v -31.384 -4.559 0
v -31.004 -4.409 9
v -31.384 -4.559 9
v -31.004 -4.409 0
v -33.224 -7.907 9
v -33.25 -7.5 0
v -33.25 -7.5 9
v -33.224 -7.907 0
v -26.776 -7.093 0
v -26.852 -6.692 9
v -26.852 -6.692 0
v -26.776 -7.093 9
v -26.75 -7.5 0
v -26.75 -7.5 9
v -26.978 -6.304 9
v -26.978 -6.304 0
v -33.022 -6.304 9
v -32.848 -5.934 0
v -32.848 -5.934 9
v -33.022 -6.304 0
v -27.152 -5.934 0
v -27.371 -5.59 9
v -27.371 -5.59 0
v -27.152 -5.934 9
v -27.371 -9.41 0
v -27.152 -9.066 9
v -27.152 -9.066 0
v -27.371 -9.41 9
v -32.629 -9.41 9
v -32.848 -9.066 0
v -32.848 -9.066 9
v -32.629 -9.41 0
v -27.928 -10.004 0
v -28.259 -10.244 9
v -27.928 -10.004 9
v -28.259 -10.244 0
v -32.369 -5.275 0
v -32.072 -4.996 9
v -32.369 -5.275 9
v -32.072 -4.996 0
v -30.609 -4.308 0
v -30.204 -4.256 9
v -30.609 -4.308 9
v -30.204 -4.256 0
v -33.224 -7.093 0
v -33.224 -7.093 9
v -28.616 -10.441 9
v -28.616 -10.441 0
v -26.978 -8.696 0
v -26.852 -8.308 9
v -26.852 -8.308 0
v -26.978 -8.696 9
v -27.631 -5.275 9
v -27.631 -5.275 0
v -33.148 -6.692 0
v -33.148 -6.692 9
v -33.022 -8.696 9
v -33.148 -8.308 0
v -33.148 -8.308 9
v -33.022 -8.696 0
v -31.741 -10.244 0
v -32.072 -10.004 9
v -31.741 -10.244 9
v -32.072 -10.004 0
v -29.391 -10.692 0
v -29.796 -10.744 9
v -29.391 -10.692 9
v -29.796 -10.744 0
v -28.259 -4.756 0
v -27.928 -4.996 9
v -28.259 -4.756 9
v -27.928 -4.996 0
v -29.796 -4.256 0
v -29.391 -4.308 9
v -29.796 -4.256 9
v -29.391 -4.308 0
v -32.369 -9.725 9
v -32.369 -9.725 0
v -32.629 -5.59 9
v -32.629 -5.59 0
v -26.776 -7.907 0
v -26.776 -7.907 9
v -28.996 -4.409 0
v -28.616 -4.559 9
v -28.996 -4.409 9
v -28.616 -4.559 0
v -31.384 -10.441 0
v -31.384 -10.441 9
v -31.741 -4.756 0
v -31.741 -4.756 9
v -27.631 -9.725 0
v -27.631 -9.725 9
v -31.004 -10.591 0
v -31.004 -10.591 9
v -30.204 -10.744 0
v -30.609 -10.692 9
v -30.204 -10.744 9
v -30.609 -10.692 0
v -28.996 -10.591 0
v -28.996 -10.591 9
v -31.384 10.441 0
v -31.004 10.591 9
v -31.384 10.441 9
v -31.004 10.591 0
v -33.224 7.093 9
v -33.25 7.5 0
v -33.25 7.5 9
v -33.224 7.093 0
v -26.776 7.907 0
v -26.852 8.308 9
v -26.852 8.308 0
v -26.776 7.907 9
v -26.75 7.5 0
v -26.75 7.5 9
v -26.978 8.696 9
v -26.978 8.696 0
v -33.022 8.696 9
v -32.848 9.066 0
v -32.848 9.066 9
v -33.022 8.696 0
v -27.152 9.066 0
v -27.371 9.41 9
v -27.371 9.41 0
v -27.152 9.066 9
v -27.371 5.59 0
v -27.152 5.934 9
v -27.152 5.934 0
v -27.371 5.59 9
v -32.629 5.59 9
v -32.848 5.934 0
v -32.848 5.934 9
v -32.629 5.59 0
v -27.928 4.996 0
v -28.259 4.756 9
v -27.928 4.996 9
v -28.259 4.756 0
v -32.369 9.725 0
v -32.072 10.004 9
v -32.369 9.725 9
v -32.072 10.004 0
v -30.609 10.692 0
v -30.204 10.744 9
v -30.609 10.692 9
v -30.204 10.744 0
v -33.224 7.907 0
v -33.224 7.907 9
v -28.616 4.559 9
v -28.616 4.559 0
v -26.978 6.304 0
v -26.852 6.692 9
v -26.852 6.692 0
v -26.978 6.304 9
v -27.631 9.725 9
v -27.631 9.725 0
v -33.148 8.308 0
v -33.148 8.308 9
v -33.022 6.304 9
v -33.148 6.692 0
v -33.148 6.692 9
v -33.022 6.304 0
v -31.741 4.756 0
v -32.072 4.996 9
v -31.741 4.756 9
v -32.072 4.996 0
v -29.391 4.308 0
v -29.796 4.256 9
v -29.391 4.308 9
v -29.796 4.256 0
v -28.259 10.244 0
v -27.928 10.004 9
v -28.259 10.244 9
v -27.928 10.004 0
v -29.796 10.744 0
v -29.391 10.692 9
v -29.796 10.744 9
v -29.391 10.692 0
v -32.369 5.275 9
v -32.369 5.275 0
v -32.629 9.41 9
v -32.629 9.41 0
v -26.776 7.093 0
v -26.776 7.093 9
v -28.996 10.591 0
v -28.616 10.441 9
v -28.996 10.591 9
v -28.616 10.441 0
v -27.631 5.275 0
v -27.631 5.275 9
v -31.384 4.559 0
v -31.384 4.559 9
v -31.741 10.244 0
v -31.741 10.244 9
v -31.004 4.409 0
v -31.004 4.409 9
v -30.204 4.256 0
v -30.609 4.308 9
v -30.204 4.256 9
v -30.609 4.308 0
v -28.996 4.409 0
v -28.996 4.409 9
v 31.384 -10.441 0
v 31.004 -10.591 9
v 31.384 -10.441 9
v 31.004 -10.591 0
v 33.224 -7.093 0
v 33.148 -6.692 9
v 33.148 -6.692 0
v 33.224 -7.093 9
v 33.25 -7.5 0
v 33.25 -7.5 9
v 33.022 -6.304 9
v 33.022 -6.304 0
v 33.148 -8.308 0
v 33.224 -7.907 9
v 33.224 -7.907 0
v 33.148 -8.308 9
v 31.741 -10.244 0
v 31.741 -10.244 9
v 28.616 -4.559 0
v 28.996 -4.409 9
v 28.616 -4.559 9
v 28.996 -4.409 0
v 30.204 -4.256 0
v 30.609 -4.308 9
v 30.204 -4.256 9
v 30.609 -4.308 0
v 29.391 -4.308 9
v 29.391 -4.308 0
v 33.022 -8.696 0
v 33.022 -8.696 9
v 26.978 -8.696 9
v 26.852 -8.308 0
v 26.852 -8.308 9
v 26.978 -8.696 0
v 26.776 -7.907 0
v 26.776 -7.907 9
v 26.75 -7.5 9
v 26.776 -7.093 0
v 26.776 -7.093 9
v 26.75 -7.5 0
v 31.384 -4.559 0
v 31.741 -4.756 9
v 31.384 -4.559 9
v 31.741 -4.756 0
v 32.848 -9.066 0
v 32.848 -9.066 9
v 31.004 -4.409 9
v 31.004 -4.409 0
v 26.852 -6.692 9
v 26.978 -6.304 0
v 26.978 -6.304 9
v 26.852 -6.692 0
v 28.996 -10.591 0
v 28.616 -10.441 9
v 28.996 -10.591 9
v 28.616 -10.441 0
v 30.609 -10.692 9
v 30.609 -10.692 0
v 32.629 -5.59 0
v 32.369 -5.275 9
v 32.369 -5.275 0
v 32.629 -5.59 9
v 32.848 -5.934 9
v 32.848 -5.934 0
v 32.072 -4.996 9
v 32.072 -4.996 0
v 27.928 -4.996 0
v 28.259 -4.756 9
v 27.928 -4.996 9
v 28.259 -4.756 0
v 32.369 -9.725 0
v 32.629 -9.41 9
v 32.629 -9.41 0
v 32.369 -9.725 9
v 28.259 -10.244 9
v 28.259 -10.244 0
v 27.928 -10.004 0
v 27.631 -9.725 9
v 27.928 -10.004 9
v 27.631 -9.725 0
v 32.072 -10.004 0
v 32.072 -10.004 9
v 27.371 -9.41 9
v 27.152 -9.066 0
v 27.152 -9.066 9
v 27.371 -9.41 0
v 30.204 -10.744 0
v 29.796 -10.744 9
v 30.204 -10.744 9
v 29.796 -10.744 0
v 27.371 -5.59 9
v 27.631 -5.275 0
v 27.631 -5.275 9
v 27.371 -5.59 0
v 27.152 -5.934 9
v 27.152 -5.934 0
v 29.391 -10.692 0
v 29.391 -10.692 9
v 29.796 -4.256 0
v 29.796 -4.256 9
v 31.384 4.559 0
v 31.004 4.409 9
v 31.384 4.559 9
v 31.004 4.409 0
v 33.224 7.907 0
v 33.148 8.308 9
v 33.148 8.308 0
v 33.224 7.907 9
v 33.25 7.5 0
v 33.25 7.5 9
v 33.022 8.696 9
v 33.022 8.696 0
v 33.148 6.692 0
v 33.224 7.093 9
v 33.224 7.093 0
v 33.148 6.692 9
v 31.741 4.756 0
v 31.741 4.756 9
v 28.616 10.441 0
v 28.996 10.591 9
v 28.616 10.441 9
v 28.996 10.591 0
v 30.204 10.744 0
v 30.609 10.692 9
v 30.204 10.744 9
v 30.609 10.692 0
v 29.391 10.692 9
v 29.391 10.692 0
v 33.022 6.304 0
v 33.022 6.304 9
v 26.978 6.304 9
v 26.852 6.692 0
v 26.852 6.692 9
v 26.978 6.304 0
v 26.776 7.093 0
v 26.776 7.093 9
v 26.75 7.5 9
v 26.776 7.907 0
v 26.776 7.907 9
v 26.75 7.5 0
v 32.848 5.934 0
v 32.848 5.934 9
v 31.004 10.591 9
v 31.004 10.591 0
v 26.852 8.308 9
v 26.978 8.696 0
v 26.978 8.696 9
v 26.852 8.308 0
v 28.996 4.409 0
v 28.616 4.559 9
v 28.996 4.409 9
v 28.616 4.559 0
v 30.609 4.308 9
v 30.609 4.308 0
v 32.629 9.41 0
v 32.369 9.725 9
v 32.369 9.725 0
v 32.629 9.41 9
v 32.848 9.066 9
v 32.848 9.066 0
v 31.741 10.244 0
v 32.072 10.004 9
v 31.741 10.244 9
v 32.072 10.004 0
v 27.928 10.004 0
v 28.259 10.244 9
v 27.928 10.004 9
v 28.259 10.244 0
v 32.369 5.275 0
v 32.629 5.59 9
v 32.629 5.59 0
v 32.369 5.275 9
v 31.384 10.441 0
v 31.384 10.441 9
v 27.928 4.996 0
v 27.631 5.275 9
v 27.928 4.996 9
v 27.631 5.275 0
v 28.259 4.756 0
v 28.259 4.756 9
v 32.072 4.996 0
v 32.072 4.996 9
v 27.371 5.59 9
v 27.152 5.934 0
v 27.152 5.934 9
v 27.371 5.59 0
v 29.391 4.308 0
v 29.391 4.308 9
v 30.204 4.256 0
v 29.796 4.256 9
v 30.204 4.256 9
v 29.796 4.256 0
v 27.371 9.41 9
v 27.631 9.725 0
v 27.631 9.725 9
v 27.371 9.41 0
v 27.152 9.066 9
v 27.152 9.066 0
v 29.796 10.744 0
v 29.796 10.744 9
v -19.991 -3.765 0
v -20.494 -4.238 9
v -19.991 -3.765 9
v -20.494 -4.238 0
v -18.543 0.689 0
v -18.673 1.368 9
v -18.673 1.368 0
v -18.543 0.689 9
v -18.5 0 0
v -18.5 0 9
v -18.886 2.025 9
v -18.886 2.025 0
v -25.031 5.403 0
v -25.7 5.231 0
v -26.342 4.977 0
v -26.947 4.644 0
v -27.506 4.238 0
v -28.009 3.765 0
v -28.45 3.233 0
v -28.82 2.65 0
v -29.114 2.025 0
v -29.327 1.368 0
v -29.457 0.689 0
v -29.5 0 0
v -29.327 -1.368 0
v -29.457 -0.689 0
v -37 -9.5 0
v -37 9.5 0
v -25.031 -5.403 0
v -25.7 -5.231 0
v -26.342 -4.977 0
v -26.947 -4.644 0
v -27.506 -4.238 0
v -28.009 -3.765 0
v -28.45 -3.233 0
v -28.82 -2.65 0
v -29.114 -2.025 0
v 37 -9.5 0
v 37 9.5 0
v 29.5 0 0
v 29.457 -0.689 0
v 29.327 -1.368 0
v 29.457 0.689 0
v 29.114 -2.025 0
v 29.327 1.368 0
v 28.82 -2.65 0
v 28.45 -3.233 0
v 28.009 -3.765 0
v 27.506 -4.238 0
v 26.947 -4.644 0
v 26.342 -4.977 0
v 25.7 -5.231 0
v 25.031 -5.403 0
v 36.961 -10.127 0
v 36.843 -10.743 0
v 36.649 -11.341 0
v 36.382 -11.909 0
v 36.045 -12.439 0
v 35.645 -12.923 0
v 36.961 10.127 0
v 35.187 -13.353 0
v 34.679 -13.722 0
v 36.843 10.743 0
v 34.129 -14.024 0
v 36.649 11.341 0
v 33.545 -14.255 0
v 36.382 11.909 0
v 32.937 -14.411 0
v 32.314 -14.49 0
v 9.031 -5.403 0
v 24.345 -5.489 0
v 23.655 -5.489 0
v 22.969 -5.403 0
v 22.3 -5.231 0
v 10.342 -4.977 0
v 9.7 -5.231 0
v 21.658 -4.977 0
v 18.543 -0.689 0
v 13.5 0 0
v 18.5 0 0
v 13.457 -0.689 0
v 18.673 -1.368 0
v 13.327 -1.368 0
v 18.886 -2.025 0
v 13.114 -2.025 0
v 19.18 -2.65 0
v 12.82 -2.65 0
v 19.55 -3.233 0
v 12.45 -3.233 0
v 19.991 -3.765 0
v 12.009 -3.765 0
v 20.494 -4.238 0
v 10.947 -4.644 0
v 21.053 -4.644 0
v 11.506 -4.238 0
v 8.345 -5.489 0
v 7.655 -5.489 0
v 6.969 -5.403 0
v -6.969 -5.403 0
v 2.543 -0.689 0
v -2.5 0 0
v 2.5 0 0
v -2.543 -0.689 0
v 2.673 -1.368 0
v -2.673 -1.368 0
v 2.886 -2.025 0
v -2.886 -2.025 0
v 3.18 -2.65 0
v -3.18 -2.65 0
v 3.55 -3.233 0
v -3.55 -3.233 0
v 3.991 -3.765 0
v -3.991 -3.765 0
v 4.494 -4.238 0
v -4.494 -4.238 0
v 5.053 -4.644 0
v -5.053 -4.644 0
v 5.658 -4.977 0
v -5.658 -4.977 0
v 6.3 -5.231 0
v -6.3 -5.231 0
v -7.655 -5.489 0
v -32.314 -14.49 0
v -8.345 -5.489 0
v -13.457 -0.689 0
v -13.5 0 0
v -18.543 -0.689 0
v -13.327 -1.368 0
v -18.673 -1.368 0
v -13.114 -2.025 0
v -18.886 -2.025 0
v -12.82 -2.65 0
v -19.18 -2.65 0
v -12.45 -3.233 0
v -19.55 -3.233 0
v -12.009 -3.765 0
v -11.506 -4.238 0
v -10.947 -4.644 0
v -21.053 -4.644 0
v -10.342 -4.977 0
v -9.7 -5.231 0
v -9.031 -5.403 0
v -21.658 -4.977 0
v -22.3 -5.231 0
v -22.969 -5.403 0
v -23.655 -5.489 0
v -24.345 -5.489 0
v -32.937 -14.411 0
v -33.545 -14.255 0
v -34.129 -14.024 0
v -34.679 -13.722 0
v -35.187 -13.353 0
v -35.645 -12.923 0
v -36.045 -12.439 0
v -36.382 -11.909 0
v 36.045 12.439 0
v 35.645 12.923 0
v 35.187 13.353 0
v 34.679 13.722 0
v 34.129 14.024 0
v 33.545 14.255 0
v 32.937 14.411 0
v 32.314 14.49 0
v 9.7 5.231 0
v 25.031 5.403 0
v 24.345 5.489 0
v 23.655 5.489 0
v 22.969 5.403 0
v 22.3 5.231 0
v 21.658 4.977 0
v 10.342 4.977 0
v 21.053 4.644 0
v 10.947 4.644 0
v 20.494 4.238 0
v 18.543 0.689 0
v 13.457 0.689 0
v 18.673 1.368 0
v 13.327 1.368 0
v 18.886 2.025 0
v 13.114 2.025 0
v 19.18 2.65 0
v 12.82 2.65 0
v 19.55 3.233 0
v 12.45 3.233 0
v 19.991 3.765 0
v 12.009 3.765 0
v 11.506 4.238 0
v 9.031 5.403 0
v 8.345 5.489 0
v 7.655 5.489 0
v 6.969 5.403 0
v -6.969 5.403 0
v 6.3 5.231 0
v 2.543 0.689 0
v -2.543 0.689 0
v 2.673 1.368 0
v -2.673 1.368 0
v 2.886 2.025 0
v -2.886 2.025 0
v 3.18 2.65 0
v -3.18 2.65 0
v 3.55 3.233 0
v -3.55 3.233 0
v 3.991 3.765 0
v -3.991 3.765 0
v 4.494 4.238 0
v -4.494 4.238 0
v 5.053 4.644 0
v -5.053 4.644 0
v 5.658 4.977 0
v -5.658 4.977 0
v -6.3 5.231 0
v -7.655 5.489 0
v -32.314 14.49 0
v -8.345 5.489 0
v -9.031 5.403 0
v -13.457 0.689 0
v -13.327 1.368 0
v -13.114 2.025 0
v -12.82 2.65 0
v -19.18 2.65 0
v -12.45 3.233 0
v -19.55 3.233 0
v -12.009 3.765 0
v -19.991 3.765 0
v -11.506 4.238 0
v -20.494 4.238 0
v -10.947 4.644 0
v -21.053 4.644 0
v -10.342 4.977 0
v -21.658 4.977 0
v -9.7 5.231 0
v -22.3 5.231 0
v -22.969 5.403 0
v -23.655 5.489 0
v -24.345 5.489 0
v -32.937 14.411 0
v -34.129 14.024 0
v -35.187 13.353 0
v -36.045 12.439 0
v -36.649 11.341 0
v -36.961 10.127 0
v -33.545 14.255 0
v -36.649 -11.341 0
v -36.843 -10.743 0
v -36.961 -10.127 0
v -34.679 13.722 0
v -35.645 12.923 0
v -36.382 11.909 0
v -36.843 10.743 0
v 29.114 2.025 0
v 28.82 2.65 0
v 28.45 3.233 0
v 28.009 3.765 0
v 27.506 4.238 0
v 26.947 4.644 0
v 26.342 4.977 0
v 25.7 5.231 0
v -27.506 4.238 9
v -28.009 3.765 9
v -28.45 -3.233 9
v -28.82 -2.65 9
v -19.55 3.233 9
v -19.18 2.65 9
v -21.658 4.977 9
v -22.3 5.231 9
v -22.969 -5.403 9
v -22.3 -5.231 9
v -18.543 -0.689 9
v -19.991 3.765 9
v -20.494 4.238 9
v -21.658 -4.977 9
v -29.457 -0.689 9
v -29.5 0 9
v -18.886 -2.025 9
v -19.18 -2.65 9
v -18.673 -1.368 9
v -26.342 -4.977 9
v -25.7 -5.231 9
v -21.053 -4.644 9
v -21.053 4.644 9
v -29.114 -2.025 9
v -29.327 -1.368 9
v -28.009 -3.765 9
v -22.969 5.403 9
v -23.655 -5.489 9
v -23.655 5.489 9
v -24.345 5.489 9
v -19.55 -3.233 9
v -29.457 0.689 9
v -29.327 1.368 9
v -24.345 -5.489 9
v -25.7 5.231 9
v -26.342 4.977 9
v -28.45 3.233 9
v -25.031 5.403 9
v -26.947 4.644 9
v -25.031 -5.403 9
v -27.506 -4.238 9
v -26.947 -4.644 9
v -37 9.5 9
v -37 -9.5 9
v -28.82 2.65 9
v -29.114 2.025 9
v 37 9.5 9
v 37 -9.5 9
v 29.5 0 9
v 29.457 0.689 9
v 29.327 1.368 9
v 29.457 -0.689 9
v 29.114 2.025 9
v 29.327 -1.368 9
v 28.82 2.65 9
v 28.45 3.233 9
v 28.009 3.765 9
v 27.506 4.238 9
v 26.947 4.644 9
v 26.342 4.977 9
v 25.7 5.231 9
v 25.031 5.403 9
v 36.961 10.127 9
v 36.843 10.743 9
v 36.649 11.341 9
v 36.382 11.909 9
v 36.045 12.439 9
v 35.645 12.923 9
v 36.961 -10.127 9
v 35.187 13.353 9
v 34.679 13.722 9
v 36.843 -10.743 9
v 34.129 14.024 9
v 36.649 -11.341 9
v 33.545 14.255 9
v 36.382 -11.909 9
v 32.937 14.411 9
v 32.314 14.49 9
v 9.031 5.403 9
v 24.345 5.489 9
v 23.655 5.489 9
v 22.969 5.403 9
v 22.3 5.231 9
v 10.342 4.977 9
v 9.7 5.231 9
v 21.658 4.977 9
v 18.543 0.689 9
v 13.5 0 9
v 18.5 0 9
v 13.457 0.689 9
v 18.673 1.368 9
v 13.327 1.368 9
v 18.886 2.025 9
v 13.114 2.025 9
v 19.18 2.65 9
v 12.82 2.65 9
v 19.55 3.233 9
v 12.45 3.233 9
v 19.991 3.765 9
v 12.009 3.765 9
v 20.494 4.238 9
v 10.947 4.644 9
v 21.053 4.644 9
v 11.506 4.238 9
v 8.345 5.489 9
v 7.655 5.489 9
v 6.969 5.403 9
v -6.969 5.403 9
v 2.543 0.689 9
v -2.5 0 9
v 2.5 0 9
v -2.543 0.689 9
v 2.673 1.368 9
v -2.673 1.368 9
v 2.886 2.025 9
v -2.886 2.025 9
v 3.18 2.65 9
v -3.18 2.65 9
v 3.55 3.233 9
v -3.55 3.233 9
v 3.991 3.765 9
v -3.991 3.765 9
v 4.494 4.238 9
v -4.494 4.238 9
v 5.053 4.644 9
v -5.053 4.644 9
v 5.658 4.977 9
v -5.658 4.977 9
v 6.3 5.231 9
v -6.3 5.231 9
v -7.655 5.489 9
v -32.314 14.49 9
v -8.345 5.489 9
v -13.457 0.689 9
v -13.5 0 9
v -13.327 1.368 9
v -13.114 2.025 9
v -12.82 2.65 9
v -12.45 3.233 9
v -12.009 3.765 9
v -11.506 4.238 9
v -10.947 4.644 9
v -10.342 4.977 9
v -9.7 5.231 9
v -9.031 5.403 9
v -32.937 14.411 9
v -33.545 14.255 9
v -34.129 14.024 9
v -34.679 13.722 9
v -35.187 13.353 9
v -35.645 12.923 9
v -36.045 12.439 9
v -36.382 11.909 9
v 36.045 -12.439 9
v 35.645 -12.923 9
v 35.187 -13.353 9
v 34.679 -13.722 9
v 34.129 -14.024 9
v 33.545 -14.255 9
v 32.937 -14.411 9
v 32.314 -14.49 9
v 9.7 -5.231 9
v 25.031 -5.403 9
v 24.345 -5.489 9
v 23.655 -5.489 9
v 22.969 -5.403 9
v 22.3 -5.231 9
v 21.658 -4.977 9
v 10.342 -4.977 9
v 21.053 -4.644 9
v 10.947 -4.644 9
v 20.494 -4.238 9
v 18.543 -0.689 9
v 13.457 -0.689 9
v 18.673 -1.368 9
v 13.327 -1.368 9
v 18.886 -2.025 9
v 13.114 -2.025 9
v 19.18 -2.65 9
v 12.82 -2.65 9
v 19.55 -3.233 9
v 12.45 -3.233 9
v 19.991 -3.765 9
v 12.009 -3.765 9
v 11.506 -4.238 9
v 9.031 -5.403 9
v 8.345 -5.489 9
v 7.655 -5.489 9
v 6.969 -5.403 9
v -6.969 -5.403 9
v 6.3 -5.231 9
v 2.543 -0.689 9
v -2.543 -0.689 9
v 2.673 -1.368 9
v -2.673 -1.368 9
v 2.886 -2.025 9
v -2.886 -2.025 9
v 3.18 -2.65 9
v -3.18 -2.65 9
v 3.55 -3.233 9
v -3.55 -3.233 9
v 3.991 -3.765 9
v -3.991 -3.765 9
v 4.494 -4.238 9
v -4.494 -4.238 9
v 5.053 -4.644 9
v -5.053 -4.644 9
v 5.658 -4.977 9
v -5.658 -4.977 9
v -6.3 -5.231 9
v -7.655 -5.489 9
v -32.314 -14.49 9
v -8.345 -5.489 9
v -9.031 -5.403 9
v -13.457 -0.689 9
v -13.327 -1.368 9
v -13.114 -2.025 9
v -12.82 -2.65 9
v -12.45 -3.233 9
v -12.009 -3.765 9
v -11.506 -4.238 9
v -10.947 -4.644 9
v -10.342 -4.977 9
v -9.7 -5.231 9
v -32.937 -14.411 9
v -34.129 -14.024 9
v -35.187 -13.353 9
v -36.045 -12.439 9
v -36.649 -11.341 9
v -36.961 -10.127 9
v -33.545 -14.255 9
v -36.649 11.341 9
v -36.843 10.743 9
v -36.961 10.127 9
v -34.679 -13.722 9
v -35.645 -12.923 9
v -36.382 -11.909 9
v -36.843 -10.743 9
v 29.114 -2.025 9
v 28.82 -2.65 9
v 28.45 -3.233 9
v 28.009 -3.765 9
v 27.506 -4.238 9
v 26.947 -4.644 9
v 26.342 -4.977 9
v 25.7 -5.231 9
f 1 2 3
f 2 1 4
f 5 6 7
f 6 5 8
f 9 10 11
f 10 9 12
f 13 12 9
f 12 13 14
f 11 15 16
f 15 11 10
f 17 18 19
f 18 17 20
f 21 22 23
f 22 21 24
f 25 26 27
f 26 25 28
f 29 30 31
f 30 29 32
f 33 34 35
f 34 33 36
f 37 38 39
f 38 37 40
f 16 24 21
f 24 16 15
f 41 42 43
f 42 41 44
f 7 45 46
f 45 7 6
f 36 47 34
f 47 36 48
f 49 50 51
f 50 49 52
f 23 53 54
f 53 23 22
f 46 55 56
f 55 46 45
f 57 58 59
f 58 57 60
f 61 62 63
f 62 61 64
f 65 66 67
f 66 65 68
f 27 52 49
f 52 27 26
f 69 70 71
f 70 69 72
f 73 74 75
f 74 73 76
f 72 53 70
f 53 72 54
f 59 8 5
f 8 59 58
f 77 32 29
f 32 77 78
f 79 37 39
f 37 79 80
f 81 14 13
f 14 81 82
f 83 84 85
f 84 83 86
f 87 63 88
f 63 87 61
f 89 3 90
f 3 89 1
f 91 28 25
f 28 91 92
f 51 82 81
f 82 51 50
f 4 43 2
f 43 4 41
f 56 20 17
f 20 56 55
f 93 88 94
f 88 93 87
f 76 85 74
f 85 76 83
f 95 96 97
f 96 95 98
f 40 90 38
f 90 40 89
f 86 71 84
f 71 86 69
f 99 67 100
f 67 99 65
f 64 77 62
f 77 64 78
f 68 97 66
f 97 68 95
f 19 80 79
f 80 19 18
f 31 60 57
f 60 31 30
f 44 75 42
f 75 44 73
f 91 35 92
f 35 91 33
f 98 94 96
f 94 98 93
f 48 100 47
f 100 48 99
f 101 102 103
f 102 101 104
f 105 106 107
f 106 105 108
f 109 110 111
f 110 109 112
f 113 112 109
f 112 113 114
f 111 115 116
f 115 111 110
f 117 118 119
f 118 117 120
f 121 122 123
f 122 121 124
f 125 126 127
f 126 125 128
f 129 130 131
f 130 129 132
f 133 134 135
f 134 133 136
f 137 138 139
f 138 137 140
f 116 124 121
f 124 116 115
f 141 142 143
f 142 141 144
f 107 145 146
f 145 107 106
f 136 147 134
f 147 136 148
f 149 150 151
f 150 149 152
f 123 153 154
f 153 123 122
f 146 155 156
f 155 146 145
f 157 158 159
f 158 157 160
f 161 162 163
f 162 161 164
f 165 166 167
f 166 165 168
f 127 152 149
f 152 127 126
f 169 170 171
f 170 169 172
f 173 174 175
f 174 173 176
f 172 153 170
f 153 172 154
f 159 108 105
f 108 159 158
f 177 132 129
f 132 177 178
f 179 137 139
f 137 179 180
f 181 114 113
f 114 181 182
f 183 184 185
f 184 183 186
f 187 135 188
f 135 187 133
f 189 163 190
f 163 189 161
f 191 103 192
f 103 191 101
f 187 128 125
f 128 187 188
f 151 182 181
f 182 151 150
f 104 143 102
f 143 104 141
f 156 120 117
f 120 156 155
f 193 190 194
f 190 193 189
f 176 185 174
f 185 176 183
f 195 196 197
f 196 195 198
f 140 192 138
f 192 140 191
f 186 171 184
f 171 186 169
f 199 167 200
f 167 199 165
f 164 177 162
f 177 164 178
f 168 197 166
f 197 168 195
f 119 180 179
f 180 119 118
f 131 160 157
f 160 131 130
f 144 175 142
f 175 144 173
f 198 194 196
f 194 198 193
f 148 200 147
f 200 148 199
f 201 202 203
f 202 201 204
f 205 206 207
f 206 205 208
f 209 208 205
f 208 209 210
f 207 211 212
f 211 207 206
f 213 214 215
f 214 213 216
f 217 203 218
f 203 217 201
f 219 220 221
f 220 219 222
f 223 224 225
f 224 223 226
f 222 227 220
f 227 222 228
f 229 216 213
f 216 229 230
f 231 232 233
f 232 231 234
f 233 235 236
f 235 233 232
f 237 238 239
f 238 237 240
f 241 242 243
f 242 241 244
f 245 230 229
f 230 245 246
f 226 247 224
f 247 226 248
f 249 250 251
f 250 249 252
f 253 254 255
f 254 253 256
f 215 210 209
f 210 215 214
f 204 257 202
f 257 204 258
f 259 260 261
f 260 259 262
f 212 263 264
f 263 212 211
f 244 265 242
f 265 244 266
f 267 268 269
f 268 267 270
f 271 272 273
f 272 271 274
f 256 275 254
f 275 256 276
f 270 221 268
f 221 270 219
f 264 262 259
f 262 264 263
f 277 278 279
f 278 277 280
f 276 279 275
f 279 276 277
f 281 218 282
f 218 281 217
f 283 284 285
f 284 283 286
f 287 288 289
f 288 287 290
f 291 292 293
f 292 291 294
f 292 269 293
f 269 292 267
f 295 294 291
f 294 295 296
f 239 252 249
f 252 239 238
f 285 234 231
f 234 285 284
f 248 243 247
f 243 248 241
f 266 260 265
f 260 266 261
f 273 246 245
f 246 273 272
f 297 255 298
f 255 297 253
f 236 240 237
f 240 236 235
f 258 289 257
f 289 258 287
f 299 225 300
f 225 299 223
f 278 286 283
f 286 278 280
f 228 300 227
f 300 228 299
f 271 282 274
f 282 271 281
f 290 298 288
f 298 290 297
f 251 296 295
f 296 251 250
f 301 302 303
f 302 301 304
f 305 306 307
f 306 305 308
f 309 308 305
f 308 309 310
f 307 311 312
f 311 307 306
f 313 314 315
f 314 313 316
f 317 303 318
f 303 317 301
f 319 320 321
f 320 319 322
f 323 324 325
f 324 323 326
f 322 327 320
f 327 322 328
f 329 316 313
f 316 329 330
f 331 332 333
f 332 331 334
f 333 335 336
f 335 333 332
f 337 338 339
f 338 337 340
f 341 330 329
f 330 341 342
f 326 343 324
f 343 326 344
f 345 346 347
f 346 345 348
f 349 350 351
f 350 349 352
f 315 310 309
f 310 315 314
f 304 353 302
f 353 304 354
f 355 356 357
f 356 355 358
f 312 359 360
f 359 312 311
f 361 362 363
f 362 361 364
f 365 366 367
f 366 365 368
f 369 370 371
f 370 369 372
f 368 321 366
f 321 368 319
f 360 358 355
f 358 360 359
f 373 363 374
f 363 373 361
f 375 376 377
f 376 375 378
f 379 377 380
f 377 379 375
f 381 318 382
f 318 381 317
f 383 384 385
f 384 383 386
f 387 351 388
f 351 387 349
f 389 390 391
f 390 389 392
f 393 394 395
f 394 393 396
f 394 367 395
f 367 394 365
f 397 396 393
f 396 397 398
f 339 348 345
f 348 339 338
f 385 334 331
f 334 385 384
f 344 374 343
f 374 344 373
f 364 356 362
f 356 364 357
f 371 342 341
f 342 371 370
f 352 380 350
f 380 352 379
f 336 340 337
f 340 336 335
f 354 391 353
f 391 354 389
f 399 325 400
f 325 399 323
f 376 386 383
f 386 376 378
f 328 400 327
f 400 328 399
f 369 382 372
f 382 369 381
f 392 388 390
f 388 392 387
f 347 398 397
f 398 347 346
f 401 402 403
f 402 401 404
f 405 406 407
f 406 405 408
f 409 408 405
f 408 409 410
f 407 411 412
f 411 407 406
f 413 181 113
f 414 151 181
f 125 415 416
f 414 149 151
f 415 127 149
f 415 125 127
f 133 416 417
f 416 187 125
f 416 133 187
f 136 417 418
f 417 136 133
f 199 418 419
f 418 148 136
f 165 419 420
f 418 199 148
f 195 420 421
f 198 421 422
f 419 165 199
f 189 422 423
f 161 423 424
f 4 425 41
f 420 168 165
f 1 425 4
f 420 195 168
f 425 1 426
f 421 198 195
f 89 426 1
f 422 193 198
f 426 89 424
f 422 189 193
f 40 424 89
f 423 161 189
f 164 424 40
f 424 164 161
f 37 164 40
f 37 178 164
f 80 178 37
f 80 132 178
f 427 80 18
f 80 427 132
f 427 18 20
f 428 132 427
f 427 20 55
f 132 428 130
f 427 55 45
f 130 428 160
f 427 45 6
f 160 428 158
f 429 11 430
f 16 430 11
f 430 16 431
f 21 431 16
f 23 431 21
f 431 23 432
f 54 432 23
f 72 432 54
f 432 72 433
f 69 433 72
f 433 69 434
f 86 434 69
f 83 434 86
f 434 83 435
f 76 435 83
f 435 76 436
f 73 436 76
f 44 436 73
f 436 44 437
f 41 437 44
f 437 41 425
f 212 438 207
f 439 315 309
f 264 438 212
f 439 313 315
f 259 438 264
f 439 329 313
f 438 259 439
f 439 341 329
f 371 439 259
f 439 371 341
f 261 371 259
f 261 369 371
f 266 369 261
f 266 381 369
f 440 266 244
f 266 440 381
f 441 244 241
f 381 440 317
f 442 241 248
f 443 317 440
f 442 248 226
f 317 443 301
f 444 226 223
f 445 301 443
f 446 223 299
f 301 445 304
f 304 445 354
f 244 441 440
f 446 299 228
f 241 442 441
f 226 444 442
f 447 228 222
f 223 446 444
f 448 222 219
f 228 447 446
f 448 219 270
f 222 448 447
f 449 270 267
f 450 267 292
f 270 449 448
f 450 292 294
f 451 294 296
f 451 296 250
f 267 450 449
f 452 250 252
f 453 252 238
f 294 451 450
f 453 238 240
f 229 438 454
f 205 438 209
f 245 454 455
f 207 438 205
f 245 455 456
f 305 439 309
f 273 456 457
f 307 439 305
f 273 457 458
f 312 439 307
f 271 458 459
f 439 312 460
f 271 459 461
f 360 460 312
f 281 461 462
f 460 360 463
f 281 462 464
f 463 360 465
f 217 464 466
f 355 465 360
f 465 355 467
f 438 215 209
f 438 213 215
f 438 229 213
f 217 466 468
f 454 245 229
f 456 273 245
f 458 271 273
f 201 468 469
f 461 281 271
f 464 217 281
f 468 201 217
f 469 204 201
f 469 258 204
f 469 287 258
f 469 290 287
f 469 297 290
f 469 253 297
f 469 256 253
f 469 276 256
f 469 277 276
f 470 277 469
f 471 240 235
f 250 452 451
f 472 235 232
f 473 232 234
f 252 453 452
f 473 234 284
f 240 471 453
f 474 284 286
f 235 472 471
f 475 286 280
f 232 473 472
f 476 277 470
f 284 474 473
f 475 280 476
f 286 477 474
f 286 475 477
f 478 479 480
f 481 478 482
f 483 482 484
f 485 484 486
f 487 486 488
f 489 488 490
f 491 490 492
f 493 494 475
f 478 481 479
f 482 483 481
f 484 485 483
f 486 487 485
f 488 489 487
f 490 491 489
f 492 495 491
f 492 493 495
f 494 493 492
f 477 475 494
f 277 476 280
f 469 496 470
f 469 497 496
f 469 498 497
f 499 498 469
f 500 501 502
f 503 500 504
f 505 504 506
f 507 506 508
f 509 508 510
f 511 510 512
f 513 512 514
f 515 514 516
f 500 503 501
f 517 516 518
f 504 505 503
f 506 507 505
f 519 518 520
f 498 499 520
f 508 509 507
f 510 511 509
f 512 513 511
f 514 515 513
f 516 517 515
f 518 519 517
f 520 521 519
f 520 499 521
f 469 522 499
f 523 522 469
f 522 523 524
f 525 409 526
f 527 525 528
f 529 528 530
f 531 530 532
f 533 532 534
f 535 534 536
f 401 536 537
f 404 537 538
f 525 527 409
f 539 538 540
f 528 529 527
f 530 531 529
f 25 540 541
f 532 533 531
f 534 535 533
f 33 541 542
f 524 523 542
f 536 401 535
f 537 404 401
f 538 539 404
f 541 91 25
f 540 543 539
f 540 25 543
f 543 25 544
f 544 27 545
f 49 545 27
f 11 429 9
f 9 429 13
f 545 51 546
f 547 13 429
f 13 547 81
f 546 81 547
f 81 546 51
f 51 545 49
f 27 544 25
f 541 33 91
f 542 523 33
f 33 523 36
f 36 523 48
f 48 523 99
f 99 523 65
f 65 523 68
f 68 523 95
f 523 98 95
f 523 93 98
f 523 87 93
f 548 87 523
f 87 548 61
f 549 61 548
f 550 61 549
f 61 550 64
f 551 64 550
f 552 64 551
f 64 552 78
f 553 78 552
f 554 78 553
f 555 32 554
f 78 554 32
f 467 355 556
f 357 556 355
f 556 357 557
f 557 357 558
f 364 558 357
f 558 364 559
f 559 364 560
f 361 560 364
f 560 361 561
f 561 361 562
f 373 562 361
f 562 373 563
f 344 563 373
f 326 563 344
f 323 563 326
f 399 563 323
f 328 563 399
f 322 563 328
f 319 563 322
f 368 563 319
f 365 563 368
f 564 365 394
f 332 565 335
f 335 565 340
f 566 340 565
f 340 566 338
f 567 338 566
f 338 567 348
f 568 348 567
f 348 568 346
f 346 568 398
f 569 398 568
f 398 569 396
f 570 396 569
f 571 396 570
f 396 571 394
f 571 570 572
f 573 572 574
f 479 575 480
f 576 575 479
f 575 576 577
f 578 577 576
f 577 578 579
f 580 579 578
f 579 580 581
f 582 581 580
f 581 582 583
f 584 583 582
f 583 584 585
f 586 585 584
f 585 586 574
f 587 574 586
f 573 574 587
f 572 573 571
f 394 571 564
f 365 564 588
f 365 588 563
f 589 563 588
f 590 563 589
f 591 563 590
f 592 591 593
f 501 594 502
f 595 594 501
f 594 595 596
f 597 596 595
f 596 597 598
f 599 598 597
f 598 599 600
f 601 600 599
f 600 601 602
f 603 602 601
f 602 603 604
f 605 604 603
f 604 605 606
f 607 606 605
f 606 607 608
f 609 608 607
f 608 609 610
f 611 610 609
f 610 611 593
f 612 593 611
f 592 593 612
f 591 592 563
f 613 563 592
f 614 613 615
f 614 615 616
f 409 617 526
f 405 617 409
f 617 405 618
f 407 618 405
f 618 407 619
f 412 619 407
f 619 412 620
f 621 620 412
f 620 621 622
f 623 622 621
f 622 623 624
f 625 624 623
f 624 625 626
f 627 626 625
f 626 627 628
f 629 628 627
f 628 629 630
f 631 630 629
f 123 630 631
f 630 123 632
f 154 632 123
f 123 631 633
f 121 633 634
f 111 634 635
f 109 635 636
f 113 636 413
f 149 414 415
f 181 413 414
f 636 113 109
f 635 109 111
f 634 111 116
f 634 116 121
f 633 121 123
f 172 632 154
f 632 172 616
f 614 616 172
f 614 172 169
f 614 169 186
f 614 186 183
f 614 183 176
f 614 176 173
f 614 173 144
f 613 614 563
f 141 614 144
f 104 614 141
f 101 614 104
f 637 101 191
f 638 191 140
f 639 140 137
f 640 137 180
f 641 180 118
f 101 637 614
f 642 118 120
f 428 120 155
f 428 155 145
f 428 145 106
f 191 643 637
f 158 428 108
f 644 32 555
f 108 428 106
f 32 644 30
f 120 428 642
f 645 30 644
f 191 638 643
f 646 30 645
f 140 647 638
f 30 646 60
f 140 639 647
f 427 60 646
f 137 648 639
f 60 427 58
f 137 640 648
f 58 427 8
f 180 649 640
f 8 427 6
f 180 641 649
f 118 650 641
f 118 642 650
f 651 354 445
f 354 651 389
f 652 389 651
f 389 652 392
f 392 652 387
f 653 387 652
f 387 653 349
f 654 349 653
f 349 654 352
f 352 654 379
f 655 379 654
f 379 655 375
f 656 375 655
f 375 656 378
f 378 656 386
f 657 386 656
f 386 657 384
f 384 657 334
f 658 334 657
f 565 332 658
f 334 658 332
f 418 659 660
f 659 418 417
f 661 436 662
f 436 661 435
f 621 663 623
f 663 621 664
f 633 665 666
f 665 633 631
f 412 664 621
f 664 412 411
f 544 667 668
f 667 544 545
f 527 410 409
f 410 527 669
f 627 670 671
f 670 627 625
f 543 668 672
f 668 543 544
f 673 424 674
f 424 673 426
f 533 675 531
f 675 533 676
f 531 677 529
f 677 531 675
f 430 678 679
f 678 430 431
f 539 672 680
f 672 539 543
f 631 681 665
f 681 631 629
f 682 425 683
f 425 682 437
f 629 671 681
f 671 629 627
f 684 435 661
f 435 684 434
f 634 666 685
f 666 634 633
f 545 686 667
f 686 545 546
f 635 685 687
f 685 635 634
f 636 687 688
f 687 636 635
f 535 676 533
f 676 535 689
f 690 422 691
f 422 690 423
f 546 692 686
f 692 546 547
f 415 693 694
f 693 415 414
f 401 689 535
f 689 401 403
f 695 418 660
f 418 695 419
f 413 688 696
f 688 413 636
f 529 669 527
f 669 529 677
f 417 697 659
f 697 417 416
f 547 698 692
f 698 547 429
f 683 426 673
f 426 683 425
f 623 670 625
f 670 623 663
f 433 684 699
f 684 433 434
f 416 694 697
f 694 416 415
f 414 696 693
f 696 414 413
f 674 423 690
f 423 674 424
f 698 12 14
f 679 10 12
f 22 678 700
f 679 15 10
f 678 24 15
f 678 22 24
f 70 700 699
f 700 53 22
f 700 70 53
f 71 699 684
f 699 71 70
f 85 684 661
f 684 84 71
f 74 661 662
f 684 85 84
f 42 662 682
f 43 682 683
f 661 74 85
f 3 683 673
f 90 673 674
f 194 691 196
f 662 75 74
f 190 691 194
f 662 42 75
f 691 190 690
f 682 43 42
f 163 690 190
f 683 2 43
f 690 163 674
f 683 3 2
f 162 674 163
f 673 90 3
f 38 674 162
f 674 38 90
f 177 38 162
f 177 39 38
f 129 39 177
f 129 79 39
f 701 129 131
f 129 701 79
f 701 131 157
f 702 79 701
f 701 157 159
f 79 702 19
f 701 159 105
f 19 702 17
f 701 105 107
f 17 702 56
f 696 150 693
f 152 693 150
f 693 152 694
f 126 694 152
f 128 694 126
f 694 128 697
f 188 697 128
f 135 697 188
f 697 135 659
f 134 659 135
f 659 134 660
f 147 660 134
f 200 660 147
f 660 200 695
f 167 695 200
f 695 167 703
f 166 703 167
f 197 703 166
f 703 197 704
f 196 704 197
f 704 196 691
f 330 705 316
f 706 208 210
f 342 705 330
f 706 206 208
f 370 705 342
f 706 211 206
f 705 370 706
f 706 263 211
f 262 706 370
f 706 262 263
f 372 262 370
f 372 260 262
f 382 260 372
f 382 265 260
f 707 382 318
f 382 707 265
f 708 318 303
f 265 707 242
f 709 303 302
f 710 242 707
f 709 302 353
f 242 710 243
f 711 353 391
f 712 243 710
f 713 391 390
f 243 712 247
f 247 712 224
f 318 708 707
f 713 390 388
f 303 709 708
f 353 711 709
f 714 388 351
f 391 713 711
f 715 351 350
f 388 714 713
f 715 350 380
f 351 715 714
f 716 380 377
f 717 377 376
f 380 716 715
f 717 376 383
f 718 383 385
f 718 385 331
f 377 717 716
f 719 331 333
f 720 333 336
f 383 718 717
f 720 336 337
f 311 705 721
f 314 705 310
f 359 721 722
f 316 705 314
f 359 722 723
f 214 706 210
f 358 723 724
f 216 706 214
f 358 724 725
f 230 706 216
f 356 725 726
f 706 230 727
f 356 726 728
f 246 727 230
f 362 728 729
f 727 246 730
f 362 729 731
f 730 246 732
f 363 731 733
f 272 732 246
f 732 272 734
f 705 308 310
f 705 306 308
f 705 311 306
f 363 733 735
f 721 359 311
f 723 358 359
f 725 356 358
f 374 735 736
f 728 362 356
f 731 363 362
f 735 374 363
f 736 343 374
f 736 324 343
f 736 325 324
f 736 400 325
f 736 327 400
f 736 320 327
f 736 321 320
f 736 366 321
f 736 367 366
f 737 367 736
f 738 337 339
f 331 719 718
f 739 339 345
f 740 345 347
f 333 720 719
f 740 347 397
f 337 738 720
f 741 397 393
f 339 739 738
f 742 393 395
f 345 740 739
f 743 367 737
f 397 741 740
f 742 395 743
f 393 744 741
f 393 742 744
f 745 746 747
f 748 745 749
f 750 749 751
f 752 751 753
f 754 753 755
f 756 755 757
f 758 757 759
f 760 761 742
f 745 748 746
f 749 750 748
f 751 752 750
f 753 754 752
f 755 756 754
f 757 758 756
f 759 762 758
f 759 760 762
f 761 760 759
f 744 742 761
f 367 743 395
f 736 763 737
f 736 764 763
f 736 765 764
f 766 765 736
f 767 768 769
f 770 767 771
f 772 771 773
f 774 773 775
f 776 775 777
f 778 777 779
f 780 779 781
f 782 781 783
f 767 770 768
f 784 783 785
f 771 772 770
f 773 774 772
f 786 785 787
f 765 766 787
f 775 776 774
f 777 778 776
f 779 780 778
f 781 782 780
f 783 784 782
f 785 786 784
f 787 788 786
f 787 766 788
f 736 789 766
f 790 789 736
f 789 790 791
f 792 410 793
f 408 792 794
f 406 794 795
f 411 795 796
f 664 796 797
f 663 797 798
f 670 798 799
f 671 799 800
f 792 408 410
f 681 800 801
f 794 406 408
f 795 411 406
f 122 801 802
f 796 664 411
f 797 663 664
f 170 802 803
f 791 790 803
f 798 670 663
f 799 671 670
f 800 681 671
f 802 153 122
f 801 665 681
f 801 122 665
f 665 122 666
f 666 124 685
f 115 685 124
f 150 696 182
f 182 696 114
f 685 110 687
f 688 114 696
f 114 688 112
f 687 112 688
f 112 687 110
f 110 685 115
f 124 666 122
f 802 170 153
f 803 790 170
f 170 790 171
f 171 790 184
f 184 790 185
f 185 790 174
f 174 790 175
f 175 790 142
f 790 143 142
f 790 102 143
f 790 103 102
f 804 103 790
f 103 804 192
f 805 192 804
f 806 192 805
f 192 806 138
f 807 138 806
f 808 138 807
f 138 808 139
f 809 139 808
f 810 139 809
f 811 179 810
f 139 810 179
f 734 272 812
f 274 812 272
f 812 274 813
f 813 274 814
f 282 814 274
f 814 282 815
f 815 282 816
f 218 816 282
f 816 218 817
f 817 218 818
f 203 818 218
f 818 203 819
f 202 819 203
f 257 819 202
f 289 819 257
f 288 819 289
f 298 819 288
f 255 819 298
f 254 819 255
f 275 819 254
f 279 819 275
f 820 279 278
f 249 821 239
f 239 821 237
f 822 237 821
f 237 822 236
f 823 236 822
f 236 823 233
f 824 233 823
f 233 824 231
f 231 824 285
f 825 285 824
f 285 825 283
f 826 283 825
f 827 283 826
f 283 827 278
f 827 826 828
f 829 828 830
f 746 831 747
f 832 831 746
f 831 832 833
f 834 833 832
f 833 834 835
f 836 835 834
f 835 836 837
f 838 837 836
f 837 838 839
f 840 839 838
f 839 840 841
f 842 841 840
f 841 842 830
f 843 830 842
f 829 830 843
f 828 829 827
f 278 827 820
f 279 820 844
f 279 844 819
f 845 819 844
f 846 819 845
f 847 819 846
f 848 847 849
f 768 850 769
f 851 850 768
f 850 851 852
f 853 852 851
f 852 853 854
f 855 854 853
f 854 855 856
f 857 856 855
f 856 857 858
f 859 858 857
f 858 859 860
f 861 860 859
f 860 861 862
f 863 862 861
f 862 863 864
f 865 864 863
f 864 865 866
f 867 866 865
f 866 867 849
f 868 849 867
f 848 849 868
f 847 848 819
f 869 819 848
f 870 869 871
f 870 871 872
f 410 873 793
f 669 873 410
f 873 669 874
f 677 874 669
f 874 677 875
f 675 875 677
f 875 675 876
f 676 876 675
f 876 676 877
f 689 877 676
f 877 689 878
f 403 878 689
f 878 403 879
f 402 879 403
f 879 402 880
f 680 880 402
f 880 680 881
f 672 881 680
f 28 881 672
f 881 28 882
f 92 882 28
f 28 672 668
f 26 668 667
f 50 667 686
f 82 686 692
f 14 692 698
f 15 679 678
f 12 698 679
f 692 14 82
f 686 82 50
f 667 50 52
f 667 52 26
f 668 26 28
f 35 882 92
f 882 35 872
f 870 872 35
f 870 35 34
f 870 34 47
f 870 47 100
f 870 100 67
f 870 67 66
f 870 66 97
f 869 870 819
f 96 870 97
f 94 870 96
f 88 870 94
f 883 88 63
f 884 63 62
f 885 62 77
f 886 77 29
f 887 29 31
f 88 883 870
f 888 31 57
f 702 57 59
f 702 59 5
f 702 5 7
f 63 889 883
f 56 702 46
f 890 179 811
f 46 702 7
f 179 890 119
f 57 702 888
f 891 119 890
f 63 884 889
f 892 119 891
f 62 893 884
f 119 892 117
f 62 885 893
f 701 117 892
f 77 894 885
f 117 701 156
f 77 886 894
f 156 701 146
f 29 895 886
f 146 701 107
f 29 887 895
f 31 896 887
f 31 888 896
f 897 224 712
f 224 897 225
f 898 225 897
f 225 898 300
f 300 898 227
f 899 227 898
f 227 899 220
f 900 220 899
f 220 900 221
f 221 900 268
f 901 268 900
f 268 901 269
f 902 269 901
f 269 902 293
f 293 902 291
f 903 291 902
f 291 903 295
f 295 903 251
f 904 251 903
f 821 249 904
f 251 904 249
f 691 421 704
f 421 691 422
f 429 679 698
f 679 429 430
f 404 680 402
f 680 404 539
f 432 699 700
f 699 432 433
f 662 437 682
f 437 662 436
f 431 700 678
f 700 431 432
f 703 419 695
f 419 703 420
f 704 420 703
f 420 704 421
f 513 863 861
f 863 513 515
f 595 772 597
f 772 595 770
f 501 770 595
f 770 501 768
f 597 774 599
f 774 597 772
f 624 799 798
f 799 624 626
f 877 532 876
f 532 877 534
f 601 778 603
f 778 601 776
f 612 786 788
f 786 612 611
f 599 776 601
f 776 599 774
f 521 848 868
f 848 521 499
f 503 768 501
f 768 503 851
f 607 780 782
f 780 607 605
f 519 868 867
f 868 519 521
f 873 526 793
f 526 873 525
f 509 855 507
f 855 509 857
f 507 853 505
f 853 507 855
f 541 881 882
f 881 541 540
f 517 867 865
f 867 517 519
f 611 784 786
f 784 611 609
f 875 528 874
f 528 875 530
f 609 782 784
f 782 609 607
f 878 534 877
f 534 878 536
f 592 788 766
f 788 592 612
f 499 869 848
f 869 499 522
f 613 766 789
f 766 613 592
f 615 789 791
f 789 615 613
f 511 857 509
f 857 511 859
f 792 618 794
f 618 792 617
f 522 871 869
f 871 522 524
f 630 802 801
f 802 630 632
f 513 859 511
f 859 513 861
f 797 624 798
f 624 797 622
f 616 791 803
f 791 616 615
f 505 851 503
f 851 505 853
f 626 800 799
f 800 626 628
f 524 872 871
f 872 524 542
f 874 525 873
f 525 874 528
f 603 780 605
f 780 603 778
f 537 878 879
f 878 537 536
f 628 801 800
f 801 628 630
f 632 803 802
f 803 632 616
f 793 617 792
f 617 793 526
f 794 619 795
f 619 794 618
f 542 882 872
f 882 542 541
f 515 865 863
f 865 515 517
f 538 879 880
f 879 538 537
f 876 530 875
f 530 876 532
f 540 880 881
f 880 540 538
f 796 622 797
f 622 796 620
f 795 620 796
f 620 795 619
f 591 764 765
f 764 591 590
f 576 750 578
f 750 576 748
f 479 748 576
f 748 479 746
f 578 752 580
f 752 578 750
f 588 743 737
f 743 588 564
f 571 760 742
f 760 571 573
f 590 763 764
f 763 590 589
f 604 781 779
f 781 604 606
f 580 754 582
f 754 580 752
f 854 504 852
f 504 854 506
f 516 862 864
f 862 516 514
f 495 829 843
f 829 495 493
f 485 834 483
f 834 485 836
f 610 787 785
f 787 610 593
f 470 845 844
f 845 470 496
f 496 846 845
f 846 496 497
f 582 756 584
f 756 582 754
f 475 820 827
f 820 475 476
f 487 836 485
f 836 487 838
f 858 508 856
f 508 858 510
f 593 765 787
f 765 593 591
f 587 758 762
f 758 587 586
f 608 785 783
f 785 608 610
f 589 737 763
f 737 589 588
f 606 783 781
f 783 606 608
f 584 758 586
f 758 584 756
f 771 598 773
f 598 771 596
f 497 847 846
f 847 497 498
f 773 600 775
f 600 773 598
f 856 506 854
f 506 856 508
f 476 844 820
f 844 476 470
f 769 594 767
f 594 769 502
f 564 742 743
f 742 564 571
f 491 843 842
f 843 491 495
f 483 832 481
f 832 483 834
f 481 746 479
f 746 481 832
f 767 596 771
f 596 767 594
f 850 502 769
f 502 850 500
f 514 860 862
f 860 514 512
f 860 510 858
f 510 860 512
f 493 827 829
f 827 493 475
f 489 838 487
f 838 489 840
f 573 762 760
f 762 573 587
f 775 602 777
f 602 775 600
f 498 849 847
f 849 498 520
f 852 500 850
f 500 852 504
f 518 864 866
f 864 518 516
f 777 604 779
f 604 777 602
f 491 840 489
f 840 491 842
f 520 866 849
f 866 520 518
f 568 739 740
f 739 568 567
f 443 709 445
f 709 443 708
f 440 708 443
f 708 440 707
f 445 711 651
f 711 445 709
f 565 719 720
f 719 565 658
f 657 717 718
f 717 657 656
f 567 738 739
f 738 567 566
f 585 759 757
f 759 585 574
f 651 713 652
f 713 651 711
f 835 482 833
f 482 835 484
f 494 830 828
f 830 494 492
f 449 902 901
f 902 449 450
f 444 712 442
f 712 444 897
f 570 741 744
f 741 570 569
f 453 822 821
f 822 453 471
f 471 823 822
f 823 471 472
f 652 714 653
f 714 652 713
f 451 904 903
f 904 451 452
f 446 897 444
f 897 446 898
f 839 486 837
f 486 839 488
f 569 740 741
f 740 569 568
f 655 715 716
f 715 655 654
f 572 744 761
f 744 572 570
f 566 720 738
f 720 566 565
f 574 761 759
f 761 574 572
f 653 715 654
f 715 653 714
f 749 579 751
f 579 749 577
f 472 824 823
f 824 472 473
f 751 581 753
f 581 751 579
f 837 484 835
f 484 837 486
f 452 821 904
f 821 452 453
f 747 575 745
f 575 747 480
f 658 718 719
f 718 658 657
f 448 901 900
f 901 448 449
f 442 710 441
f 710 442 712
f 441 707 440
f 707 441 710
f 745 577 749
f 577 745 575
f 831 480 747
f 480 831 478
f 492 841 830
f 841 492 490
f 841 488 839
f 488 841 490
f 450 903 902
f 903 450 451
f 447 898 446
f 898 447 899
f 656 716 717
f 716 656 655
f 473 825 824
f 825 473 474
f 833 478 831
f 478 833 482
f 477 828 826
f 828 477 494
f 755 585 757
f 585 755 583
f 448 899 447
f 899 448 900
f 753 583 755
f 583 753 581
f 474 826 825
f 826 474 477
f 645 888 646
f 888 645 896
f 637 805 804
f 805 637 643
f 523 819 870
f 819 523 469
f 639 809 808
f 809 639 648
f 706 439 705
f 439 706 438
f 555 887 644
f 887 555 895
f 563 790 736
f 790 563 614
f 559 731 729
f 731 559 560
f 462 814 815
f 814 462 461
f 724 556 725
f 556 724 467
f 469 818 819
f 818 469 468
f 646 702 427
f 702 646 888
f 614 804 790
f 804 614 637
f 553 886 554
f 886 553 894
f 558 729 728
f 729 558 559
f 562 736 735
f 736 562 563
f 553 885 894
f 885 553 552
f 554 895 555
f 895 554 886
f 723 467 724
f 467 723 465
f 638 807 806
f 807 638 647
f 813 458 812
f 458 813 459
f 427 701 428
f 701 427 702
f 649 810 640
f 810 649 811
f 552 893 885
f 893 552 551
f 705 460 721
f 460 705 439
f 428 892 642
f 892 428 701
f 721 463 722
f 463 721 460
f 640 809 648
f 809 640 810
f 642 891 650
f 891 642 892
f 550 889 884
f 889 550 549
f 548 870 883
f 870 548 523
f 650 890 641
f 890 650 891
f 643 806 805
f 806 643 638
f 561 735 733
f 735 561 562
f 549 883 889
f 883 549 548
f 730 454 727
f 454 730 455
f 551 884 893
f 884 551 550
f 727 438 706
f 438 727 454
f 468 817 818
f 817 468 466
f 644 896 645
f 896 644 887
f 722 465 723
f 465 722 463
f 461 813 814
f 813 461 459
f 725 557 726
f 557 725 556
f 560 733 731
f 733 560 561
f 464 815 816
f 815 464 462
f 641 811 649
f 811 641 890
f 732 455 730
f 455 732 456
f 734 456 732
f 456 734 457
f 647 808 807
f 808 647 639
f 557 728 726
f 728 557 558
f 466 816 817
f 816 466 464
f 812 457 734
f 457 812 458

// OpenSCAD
$fn = 50;


difference() {
	union() {
		hull() {
			translate(v = [-32.0000000000, 9.5000000000, 0]) {
				cylinder(h = 9, r = 5);
			}
			translate(v = [32.0000000000, 9.5000000000, 0]) {
				cylinder(h = 9, r = 5);
			}
			translate(v = [-32.0000000000, -9.5000000000, 0]) {
				cylinder(h = 9, r = 5);
			}
			translate(v = [32.0000000000, -9.5000000000, 0]) {
				cylinder(h = 9, r = 5);
			}
		}
	}
	union() {
		#translate(v = [-30.0000000000, -7.5000000000, -100.0000000000]) {
			cylinder(h = 200, r = 3.2500000000);
		}
		#translate(v = [-30.0000000000, 7.5000000000, -100.0000000000]) {
			cylinder(h = 200, r = 3.2500000000);
		}
		#translate(v = [30.0000000000, -7.5000000000, -100.0000000000]) {
			cylinder(h = 200, r = 3.2500000000);
		}
		#translate(v = [30.0000000000, 7.5000000000, -100.0000000000]) {
			cylinder(h = 200, r = 3.2500000000);
		}
		#translate(v = [-24.0000000000, 0, 0]) {
			cylinder(h = 9, r = 5.5000000000);
		}
		#translate(v = [-8.0000000000, 0, 0]) {
			cylinder(h = 9, r = 5.5000000000);
		}
		#translate(v = [8.0000000000, 0, 0]) {
			cylinder(h = 9, r = 5.5000000000);
		}
		#translate(v = [24.0000000000, 0, 0]) {
			cylinder(h = 9, r = 5.5000000000);
		}
	}
}
